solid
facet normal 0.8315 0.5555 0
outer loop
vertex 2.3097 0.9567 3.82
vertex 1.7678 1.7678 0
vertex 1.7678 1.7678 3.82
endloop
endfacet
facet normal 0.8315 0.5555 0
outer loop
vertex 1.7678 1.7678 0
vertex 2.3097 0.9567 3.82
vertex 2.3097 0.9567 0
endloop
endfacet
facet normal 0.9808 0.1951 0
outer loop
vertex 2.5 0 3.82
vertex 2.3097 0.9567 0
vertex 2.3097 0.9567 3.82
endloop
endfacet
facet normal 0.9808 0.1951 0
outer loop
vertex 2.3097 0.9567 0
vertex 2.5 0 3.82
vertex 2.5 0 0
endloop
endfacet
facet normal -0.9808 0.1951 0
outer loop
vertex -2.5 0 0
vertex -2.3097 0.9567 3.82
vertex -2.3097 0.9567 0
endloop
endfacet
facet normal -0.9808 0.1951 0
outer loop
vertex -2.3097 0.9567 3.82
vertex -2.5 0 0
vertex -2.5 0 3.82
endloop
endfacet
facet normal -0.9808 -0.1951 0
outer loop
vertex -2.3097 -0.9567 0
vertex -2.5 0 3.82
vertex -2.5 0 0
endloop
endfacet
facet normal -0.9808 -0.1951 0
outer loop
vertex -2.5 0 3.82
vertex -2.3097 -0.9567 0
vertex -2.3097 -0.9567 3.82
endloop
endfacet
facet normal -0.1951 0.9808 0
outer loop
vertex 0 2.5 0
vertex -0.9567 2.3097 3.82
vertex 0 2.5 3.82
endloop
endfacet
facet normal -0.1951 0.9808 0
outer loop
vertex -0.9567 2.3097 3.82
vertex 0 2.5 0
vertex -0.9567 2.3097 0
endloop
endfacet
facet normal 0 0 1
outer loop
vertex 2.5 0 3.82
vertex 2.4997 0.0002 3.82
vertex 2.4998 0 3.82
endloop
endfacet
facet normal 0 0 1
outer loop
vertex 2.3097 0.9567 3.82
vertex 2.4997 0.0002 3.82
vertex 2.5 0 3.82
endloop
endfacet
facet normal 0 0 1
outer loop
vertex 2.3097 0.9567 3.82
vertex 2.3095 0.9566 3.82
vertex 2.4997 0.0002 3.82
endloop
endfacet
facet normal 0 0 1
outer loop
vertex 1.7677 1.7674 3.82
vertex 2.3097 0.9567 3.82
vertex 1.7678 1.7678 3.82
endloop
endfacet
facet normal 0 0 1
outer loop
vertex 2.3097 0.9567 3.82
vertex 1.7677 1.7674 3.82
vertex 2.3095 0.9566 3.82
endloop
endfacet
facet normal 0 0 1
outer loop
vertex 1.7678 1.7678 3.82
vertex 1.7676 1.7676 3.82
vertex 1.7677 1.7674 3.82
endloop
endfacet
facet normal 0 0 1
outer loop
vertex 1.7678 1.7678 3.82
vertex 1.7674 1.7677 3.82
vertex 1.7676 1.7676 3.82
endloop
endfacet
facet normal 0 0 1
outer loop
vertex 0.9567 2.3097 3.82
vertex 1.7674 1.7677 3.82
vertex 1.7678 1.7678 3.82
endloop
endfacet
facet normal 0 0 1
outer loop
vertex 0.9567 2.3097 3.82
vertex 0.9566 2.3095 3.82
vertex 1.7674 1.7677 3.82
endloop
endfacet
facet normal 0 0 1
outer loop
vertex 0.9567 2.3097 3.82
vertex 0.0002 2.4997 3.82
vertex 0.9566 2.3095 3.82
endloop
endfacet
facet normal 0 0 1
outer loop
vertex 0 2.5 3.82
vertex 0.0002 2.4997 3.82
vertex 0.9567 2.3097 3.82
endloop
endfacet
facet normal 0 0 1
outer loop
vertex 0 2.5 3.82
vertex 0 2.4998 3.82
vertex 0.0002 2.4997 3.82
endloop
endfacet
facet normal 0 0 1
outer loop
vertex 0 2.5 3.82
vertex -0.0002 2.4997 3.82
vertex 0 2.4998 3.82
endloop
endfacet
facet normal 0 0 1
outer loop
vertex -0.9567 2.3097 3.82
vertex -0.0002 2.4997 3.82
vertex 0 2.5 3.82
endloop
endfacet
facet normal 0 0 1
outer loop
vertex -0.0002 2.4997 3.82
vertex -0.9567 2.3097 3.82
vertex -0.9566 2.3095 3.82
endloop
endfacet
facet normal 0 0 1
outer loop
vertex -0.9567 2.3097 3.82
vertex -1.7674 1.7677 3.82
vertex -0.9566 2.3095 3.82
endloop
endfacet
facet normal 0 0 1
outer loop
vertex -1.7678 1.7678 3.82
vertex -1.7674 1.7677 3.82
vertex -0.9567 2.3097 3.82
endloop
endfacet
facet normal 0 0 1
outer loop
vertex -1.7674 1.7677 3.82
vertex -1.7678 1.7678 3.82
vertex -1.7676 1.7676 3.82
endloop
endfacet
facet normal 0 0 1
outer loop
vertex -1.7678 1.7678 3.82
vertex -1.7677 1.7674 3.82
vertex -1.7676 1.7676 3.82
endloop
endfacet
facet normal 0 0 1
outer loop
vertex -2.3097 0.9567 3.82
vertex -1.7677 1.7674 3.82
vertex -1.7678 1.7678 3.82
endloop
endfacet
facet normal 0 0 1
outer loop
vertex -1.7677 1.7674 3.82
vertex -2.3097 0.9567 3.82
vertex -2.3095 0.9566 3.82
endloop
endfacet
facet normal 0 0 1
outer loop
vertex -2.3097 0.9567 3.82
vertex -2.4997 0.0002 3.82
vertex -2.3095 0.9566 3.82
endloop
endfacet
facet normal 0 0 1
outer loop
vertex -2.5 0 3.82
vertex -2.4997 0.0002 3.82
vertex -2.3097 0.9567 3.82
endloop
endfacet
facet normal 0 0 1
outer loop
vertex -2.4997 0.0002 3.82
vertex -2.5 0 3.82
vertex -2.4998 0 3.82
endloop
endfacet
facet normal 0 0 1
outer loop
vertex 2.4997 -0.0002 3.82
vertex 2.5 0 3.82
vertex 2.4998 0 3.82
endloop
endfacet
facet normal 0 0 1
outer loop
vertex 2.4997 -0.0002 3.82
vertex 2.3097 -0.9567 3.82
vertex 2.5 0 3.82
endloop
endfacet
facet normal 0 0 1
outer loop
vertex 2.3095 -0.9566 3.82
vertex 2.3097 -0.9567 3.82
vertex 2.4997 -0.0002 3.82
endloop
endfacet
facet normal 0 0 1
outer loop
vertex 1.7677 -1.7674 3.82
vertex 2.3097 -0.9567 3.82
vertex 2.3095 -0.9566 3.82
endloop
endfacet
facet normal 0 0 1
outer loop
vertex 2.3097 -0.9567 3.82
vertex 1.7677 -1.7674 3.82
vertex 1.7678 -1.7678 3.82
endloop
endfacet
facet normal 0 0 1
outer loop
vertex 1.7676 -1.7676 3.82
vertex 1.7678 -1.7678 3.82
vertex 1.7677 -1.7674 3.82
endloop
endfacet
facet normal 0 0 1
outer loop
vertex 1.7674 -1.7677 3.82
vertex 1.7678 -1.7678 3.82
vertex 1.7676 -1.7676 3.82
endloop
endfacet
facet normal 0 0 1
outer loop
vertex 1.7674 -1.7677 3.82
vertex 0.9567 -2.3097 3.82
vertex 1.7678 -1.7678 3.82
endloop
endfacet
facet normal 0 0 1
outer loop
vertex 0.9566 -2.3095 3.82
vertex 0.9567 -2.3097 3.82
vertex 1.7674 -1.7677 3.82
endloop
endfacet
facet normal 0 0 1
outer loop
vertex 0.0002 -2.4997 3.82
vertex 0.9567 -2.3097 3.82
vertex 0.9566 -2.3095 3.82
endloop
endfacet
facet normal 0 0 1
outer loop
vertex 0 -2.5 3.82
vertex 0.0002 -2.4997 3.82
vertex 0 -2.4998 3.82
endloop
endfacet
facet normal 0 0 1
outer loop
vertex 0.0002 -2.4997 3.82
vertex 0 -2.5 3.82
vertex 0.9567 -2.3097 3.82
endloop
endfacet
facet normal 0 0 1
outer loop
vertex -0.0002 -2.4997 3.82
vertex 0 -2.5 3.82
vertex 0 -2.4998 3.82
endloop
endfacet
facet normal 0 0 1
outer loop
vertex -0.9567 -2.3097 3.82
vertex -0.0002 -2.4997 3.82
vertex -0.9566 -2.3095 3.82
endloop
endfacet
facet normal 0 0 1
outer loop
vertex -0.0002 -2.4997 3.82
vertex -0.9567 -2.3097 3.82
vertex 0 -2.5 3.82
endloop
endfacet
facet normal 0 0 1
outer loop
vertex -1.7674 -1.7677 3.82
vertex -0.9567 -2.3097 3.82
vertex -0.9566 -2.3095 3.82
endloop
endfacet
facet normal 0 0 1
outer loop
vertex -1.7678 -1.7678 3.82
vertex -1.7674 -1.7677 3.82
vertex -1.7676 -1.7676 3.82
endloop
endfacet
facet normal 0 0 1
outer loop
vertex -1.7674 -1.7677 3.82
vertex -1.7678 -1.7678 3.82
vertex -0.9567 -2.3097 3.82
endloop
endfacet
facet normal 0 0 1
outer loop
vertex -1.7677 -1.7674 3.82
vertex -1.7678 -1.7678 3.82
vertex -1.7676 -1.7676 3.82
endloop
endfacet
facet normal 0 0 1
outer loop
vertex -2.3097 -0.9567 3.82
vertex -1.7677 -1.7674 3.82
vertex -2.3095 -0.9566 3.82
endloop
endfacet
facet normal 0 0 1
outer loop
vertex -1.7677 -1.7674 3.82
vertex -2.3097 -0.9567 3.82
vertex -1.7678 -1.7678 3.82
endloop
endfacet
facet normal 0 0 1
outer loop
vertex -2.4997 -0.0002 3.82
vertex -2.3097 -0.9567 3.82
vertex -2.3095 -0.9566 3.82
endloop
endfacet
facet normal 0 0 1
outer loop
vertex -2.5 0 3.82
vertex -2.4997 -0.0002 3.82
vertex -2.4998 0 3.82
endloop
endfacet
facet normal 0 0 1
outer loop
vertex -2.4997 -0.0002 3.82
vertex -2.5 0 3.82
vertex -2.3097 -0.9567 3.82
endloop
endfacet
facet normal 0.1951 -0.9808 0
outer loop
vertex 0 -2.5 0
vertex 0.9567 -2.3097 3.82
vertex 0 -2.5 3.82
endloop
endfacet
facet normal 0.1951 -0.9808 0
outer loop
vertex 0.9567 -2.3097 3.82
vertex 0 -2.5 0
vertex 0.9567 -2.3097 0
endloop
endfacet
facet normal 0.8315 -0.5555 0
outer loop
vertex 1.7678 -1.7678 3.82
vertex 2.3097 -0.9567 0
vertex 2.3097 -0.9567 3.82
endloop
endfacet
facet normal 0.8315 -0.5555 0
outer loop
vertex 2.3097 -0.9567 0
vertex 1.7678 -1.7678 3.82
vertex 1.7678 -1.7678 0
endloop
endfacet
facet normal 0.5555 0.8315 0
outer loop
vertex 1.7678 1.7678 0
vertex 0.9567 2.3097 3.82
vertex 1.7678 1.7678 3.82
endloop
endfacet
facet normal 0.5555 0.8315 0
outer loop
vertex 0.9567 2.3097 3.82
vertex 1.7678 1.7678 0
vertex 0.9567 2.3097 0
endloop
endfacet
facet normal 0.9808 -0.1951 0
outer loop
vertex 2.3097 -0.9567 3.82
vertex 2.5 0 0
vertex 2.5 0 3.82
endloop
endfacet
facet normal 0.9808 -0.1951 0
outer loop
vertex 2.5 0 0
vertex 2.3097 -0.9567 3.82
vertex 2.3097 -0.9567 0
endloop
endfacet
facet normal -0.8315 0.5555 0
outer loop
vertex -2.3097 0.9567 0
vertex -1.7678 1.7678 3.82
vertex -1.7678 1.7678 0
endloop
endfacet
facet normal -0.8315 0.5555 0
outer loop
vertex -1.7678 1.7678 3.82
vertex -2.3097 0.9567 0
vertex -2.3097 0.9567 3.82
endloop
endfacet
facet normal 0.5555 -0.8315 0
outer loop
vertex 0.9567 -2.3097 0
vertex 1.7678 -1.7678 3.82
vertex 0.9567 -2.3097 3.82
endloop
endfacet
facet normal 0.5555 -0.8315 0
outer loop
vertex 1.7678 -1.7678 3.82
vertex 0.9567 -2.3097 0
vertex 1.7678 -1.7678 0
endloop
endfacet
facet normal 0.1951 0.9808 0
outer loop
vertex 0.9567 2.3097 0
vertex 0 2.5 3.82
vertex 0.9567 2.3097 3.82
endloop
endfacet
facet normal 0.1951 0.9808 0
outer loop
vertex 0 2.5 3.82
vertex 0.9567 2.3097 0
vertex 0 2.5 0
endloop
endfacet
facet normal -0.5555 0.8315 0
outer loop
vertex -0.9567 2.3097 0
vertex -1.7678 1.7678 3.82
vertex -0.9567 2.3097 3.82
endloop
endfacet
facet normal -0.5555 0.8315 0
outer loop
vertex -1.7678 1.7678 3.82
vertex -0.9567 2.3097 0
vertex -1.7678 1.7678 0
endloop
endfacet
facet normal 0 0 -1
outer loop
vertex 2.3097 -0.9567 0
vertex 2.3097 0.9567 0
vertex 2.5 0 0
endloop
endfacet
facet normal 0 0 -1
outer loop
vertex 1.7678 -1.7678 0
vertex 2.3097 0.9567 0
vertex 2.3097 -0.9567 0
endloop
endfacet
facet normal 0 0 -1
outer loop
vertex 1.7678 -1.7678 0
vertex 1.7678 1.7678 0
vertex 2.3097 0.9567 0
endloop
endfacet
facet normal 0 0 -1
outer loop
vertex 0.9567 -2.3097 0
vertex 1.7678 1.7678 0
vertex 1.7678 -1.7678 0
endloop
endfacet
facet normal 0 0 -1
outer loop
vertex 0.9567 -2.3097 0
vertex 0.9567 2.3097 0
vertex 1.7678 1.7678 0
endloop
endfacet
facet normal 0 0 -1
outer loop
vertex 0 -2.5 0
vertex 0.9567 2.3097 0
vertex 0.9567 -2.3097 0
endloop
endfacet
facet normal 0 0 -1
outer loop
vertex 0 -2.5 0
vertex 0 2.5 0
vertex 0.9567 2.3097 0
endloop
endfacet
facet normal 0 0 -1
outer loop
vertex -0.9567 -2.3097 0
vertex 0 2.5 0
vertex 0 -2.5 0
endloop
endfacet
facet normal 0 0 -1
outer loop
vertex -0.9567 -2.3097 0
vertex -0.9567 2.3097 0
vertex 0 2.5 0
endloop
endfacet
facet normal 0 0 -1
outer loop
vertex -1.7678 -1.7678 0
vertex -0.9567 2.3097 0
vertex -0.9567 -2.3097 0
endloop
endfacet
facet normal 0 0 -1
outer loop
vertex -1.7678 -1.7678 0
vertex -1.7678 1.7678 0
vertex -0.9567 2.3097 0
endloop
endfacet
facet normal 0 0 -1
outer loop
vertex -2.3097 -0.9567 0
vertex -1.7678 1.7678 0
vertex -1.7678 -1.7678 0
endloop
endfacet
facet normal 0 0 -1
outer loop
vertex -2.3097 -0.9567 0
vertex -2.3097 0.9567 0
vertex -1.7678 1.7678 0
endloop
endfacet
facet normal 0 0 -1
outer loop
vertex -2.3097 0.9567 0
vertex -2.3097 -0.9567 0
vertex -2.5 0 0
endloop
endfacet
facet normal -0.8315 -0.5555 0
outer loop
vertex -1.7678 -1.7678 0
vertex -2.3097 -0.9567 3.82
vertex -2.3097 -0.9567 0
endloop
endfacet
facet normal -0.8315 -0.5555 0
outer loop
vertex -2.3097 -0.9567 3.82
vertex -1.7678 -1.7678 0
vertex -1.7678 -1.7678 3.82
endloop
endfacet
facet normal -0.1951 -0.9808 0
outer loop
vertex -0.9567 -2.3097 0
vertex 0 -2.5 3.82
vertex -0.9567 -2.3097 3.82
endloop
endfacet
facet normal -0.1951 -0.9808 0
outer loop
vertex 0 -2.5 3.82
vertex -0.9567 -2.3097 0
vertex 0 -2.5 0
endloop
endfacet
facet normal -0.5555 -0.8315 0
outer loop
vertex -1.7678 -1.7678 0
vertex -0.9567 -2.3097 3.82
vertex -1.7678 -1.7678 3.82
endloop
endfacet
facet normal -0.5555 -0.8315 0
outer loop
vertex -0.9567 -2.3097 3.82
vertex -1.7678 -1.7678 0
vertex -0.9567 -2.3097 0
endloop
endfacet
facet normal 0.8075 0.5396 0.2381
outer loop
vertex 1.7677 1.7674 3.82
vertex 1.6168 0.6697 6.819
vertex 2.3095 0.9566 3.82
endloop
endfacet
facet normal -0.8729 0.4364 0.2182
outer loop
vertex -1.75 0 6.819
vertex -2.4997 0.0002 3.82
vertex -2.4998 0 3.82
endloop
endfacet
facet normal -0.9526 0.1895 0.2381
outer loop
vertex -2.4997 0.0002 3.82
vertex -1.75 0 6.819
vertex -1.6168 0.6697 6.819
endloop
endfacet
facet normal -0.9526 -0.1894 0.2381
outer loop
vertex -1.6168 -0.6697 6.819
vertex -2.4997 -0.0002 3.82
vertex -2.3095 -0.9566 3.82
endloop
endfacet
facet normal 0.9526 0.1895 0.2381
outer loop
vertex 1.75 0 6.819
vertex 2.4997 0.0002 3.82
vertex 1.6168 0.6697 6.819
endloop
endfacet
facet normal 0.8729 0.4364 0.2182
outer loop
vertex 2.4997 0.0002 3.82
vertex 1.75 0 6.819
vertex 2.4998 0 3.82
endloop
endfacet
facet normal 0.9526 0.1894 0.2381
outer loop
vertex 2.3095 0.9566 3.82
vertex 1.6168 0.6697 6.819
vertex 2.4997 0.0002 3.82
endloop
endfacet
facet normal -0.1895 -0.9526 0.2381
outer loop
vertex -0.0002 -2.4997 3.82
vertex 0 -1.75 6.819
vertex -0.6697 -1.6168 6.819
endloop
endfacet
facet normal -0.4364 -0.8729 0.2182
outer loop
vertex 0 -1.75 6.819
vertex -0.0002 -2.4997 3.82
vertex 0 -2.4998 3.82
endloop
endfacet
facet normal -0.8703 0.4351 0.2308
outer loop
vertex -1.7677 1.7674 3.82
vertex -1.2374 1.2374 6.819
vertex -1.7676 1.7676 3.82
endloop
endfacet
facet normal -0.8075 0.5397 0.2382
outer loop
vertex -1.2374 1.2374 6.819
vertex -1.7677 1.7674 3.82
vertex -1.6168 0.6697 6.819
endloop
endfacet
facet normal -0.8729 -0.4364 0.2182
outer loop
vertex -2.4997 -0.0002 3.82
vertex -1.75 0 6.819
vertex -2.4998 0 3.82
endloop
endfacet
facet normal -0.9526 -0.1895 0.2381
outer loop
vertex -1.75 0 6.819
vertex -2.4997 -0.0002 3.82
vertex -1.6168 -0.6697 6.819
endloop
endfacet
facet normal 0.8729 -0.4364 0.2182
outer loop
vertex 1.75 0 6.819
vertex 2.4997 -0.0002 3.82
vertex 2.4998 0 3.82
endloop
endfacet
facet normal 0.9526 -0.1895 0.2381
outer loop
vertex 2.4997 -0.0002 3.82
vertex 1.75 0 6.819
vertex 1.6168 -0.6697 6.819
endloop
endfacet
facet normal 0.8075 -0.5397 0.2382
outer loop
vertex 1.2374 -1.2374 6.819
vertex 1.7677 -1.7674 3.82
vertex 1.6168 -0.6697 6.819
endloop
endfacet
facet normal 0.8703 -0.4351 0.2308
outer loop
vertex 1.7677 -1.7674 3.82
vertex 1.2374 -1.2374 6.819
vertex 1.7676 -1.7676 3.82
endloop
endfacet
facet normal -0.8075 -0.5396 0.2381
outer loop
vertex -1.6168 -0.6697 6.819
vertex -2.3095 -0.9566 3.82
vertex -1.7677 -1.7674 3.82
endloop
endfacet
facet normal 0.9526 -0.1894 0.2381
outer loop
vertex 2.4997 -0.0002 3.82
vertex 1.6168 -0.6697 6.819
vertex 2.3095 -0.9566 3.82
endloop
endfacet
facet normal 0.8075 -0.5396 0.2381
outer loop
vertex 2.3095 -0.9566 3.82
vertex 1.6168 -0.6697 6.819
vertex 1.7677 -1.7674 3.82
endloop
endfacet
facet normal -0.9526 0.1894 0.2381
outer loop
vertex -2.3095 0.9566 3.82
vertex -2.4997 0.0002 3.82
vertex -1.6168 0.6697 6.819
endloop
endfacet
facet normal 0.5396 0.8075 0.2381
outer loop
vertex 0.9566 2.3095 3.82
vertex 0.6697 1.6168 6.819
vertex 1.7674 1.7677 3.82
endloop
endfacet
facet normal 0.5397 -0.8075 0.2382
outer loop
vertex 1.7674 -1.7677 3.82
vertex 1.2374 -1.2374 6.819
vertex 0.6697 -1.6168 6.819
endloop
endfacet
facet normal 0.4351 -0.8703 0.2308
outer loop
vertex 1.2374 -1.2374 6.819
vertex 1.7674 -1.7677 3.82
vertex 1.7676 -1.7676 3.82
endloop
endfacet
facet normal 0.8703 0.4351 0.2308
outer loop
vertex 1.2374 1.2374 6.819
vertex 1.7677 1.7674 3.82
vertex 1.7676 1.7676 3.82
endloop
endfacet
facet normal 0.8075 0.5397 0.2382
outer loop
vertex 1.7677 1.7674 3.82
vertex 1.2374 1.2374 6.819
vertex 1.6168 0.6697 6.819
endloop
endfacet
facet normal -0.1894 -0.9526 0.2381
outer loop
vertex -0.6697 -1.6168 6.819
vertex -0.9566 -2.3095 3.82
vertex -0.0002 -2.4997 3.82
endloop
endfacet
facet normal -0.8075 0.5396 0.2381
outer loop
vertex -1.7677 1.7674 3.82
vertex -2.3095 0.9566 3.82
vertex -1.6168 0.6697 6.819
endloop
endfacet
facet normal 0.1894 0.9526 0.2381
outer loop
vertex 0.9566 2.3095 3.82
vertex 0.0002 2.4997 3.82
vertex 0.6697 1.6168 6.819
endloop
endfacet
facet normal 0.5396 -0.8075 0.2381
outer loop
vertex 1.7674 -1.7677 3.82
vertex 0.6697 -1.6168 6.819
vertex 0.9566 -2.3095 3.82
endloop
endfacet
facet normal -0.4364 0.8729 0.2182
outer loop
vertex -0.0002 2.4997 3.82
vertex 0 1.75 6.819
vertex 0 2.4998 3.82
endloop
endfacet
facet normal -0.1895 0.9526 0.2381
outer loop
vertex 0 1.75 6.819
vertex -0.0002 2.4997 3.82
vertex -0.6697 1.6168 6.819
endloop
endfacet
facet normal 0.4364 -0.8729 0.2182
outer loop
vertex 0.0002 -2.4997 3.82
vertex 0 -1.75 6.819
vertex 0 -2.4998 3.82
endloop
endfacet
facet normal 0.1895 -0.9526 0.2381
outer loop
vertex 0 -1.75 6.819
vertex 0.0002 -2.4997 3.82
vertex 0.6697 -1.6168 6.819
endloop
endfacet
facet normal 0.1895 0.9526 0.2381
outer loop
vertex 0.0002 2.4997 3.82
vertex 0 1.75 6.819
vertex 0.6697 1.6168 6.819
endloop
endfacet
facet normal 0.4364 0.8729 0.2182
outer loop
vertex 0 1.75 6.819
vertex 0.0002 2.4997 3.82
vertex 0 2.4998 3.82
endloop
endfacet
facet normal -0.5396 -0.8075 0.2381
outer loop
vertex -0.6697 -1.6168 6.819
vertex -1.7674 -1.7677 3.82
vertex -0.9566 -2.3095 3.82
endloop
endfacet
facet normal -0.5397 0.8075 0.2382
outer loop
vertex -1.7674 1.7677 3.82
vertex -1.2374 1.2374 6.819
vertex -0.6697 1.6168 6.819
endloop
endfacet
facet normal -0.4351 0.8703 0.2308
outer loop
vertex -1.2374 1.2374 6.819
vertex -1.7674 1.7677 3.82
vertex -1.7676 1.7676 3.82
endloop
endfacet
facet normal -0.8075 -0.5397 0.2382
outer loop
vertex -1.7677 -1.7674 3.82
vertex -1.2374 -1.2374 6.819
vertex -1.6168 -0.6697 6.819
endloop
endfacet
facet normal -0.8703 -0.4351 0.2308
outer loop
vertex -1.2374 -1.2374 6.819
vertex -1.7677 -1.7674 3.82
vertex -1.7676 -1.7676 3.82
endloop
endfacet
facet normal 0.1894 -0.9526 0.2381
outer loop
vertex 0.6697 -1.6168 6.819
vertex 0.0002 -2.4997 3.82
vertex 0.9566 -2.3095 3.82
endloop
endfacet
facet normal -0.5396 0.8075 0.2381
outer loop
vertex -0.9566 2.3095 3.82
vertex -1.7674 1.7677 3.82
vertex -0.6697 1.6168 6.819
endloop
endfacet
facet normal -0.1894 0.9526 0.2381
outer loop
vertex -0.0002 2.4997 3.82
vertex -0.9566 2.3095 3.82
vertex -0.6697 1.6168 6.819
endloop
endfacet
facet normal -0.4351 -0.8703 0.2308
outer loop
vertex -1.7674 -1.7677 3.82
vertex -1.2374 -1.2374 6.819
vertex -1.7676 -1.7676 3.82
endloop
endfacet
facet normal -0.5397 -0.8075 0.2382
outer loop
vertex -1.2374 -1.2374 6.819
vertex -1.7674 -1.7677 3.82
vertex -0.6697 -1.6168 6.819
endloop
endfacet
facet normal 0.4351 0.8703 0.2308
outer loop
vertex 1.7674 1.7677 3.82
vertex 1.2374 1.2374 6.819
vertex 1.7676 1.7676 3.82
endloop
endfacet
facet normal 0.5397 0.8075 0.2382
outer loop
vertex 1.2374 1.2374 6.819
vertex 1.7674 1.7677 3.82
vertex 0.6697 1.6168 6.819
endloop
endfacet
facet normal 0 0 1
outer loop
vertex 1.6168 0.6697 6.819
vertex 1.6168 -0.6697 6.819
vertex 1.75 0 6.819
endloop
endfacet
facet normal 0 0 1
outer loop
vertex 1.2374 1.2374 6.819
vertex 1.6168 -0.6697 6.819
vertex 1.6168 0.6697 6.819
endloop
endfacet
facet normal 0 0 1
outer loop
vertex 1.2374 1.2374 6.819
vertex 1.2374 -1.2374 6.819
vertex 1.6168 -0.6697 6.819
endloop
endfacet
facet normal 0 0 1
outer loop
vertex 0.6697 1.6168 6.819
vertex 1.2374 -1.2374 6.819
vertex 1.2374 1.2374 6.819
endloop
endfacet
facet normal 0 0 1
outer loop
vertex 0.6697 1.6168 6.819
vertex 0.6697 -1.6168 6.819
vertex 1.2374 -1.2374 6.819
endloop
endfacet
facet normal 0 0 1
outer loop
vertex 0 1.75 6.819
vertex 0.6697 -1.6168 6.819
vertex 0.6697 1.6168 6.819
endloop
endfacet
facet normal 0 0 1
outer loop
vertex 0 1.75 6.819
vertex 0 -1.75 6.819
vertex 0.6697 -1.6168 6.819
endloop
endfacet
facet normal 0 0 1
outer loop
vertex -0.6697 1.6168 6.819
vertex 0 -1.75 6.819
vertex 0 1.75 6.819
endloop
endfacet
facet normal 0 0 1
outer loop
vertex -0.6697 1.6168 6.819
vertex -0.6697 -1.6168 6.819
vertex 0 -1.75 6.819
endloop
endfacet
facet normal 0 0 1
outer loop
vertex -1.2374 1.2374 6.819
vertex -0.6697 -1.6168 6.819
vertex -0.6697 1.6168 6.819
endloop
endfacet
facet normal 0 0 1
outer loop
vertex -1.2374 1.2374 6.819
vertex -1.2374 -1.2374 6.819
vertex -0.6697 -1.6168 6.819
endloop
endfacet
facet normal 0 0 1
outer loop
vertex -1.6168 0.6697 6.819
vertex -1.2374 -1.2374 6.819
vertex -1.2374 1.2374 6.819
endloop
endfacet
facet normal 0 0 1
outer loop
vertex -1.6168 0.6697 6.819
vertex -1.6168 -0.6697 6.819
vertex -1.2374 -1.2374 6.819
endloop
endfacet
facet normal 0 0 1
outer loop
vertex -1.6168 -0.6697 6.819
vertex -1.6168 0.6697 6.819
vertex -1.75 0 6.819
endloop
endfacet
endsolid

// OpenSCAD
// file: m3_insert.scad
module m3_insert() {
    translate([0, 0, -3.82/2])
        difference() {
            cylinder(h=3.82, r=2.5, center=true);
            cylinder(h = 4, r = 1.5, center=true);
        }
}

m3_insert();
// main file
use <m3_insert.scad>

module negative_insert() {
    $fs=1;
    $fa=0.4;

    translate([0, 0, 3.82])
    union() {
        translate([0, 0, -(3.82/2)])
        cylinder(h=3.82, r=2.5, center=true);
        translate([0, 0, -0.001])
        linear_extrude(height=3, scale=0.7)
        circle(r=2.5);
    }
}

negative_insert();
